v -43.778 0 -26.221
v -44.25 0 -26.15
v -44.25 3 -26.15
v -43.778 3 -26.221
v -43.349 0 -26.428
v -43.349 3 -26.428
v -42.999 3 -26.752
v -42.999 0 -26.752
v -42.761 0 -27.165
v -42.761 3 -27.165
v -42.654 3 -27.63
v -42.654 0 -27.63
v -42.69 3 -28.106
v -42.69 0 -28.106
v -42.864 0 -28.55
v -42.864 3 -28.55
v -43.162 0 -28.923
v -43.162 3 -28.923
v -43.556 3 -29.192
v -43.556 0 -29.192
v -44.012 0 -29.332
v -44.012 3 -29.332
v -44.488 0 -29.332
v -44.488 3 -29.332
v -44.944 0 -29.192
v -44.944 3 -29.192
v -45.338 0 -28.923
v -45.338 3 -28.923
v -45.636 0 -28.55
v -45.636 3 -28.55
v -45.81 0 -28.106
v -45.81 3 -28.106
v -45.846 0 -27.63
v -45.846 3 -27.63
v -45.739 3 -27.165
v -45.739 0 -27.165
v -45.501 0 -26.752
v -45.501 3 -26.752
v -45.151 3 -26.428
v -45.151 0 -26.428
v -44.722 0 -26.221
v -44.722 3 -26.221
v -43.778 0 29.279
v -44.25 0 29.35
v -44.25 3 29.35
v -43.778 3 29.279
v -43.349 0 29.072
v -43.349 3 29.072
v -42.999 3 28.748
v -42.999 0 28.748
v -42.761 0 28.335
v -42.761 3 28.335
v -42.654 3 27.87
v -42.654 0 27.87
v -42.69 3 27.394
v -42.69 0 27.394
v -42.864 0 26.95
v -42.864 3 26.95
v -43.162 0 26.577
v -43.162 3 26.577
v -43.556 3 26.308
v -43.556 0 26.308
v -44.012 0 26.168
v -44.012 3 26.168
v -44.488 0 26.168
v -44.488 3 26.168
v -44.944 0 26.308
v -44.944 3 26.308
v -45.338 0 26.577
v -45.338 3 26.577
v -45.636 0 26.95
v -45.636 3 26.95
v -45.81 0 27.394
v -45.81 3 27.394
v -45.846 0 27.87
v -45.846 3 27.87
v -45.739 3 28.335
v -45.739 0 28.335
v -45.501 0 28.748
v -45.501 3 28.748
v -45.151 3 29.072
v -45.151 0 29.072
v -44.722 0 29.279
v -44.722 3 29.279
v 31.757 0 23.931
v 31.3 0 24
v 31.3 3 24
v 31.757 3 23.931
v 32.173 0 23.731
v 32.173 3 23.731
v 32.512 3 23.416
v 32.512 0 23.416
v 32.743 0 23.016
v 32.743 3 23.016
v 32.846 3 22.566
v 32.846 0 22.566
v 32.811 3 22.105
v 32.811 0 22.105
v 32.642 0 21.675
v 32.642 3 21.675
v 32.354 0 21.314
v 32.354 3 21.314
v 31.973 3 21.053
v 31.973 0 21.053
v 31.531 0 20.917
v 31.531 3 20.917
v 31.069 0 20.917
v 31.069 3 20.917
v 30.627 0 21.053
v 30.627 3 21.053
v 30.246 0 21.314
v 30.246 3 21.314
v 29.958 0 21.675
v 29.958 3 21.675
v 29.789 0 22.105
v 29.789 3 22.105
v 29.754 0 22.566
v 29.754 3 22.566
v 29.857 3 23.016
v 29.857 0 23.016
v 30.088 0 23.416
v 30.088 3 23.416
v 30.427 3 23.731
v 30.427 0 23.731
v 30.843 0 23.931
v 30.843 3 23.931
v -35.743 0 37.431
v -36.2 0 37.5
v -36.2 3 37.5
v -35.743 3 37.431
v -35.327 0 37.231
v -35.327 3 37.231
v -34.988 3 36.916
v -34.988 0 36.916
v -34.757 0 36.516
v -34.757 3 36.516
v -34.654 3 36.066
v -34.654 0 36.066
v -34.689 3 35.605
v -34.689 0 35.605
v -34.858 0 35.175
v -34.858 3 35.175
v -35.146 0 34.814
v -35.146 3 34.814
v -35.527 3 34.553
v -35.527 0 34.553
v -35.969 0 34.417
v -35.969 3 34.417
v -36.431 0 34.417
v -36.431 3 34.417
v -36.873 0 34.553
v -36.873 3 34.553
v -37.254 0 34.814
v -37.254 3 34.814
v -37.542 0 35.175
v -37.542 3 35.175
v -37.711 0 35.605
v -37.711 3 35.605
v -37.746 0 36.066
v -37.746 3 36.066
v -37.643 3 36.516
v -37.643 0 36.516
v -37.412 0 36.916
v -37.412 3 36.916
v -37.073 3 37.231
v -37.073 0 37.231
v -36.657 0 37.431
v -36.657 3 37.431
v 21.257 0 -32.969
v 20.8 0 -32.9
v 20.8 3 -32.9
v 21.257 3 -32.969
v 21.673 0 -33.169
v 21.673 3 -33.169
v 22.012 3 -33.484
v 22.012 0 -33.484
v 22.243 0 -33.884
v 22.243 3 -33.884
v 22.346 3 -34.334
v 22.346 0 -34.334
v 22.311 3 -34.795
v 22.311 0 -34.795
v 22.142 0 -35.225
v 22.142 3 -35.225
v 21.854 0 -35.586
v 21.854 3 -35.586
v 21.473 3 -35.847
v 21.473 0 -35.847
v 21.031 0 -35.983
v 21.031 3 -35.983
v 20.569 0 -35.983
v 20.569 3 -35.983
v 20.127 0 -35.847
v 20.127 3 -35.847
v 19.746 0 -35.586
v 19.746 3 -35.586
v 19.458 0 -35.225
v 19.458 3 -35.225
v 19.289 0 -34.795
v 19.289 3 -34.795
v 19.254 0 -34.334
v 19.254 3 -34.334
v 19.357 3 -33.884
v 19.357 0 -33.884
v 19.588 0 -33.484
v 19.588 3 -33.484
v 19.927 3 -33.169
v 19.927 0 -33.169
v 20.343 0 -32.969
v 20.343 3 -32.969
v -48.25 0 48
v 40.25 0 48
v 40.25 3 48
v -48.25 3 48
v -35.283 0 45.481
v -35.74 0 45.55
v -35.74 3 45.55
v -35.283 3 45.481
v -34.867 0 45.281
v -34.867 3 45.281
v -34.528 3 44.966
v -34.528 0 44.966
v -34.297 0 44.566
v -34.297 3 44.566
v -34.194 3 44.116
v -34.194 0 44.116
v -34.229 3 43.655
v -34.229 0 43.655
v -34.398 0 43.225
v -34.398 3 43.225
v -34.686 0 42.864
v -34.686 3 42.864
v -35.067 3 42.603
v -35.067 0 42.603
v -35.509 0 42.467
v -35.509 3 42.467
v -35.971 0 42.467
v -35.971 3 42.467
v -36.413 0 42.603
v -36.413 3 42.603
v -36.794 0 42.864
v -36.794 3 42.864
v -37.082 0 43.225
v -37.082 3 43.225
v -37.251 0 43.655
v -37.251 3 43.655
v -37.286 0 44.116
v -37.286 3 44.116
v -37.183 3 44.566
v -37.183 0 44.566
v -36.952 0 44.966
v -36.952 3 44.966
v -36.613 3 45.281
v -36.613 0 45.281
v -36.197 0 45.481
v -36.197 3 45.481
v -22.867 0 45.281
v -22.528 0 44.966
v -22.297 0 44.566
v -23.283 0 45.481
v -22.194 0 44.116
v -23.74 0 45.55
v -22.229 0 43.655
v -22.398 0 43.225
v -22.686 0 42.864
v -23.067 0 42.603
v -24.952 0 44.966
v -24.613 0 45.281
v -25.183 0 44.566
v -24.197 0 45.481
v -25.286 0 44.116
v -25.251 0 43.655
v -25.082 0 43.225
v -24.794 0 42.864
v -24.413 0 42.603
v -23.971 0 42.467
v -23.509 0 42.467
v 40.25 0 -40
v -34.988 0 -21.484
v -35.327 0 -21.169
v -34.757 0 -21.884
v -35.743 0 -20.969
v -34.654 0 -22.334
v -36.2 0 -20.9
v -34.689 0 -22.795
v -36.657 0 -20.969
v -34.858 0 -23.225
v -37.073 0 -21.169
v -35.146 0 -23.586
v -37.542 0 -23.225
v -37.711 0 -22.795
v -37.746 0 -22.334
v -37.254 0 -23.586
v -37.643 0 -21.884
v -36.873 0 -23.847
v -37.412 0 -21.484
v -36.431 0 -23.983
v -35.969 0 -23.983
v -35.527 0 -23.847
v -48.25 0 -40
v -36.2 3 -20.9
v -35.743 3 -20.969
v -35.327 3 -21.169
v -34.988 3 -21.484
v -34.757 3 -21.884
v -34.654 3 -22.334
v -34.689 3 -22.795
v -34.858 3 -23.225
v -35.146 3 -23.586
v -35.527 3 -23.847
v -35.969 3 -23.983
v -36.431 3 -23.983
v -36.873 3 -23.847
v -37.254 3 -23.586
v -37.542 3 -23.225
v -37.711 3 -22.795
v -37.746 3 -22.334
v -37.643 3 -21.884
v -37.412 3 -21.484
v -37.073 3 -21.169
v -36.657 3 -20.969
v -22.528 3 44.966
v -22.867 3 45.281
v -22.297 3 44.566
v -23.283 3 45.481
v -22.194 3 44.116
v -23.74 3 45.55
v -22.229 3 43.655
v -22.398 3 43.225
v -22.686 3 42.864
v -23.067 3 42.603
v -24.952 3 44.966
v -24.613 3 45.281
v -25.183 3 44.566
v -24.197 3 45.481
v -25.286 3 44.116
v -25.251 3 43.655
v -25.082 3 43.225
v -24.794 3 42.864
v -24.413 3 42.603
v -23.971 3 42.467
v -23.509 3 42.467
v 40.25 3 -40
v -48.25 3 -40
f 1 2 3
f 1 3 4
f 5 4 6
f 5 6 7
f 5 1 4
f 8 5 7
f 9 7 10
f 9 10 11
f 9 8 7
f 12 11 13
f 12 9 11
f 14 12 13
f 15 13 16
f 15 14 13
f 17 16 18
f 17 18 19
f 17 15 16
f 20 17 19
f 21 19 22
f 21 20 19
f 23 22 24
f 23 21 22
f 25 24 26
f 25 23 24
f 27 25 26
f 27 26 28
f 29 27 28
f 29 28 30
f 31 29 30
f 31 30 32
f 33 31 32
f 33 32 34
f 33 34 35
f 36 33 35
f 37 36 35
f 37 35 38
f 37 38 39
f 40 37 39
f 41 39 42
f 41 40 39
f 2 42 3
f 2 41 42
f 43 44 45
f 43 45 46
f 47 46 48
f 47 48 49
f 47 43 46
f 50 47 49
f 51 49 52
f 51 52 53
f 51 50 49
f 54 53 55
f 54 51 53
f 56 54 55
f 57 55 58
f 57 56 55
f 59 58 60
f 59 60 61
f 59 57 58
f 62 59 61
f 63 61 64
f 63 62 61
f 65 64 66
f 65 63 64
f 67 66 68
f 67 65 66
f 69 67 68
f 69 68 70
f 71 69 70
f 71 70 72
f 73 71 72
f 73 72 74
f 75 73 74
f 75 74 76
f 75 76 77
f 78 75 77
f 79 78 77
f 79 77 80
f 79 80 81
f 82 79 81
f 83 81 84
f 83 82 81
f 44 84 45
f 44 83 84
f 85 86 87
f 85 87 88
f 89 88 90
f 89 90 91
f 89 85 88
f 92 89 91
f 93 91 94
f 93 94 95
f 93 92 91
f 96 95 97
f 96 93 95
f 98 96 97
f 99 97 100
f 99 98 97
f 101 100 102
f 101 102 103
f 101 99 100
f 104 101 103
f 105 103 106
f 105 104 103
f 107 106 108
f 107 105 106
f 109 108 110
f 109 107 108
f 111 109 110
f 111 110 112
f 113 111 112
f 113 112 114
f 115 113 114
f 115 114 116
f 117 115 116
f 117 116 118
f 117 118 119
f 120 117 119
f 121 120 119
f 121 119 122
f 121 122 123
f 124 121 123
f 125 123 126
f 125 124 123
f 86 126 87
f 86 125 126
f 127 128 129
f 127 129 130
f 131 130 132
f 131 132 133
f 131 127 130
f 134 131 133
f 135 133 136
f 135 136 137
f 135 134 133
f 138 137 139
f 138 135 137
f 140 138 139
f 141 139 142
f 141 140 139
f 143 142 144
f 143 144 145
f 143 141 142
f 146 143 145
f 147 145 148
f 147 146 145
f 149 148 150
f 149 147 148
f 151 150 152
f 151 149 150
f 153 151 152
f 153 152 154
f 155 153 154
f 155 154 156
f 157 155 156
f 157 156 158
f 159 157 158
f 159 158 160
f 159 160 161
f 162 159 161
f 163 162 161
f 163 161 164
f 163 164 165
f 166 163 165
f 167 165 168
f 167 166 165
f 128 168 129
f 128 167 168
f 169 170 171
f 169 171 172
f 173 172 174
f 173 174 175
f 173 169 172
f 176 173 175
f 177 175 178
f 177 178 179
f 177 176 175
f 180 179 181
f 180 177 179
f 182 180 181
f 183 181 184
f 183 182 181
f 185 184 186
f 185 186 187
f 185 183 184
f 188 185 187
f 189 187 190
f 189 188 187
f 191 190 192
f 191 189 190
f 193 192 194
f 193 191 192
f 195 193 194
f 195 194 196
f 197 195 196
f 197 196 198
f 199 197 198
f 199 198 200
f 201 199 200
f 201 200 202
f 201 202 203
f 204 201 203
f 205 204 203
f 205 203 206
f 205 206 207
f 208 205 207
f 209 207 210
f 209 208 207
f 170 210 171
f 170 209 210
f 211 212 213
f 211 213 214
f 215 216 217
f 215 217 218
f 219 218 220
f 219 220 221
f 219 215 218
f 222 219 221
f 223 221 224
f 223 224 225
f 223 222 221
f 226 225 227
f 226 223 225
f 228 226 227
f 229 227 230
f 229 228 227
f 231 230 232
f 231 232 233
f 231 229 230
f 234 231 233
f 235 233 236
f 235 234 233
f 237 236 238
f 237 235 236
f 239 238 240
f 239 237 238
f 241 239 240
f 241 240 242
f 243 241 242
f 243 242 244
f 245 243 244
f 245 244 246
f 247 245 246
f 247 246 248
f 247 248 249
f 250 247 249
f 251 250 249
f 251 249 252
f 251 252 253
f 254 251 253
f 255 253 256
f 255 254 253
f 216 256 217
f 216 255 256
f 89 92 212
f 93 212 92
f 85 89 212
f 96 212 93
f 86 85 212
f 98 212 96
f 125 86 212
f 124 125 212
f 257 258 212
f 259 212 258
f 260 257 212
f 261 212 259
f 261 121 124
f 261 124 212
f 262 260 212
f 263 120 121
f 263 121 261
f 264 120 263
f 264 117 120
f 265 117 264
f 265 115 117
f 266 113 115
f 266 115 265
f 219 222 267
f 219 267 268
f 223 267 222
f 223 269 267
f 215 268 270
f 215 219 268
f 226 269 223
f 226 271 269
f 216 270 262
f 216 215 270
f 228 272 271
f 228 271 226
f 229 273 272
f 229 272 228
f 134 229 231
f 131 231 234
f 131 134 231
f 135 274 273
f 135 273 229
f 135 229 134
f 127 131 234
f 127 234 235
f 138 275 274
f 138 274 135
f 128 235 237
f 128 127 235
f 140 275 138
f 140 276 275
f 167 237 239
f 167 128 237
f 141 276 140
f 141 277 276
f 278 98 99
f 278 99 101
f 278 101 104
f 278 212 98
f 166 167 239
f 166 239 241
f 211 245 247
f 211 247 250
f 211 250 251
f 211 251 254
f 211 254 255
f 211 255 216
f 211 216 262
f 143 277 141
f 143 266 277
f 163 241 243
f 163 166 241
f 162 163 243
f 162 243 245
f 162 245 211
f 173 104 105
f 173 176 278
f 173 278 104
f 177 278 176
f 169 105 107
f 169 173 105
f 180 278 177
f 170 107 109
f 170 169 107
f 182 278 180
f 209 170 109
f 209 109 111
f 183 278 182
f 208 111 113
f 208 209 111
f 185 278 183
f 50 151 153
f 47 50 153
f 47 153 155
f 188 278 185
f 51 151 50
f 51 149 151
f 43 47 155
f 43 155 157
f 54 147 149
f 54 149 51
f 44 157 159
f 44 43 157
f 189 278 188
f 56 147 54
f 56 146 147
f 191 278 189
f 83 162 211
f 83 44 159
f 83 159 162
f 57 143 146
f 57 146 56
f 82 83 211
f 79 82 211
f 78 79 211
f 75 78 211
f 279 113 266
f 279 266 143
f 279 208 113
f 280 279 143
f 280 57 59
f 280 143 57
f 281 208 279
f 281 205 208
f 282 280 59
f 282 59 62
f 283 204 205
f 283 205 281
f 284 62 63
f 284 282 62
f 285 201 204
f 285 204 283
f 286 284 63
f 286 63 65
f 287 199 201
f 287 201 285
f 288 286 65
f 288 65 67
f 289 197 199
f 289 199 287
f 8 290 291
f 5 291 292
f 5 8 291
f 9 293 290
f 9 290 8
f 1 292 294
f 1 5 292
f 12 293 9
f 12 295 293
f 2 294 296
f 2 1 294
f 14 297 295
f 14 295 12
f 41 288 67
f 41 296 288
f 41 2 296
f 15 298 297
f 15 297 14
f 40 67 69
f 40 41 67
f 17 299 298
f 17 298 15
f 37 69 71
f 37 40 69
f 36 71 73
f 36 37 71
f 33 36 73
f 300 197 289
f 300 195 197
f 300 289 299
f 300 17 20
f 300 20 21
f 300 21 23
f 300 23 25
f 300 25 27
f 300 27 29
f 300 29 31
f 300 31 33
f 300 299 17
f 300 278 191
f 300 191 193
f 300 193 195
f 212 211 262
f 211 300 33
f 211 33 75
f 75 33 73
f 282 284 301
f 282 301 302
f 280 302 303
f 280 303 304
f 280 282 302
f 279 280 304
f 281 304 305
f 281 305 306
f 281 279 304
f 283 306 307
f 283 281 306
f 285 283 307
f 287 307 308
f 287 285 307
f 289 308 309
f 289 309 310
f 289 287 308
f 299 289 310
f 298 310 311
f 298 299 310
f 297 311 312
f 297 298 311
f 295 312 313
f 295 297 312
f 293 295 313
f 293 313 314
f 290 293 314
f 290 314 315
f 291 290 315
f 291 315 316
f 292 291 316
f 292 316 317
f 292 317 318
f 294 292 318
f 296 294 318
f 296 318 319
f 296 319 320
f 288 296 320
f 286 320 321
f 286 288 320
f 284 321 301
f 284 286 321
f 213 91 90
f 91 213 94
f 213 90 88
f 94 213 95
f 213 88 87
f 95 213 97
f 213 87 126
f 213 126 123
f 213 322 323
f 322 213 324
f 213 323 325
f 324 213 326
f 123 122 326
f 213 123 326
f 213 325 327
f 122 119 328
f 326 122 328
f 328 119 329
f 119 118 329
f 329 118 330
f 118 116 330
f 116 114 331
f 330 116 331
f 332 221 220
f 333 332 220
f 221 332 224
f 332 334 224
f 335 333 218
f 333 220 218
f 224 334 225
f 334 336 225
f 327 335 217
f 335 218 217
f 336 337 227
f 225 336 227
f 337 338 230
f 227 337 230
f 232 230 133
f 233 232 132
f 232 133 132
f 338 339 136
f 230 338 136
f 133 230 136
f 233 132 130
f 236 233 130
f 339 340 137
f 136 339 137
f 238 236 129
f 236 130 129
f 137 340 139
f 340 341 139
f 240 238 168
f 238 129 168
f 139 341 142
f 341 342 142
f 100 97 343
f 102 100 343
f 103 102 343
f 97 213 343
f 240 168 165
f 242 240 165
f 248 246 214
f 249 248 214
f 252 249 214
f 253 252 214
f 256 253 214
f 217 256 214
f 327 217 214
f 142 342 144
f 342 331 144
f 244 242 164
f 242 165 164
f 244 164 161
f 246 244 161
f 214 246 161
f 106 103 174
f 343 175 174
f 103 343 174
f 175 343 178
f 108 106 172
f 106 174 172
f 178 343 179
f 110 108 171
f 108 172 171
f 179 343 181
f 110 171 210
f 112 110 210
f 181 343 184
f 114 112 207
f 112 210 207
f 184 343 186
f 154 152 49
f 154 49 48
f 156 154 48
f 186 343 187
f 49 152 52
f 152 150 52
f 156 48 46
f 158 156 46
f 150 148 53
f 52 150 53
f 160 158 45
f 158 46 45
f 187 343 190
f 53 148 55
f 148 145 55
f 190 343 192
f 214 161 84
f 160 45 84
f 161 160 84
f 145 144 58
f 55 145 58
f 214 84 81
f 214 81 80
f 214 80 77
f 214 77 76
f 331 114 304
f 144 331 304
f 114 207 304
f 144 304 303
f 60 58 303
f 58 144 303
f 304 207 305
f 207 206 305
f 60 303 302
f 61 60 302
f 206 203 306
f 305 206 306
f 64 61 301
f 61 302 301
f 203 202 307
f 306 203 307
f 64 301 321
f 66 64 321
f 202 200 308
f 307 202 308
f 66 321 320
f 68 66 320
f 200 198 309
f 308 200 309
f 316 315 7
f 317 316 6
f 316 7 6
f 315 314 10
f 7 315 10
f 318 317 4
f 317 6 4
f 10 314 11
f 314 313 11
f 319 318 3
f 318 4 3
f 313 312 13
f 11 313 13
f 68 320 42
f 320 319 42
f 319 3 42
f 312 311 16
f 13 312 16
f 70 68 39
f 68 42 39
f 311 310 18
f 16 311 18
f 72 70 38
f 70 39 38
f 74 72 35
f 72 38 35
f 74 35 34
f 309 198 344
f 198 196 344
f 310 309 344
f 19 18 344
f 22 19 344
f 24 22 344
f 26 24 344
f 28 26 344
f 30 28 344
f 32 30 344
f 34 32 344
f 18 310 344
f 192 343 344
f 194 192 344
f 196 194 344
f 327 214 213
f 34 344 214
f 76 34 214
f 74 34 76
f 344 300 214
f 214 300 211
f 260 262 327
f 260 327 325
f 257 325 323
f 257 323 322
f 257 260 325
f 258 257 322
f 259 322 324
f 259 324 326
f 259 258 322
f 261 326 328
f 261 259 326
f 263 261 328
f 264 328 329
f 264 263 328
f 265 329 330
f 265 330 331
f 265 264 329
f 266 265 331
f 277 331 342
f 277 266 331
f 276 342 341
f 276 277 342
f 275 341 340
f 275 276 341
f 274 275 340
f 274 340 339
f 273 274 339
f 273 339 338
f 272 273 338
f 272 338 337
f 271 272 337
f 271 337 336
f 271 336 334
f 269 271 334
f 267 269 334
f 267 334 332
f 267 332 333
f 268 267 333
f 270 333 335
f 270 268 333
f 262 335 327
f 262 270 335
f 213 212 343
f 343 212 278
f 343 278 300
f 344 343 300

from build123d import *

# Parameters (mm, degrees)
SKETCH1_R           = 1.55
SKETCH1_R_2         = 1.6
BOSS_EXTRUDE1_DEPTH = 3


with BuildPart() as part:
    # Sketch1 → Boss-Extrude1 (new body)
    with BuildSketch(Plane(origin=(0, 0, 0), x_dir=(1, 0, 0), z_dir=(0, 1, 0))):
        Polygon((-40.25, 40), (40.25, 40), (40.25, -40), (40.25, -48), (-48.25, -48), (-48.25, -40), (-48.25, 40), align=None)
        with Locations(Location((-36.2, -35.95, 0), (0, 0, 270))):
            Circle(SKETCH1_R, mode=Mode.SUBTRACT)
        with Locations(Location((-36.2, 22.45, 0), (0, 0, 270))):
            Circle(SKETCH1_R, mode=Mode.SUBTRACT)
        with Locations(Location((20.8, 34.45, 0), (0, 0, 270))):
            Circle(SKETCH1_R, mode=Mode.SUBTRACT)
        with Locations(Location((31.3, -22.45, 0), (0, 0, 270))):
            Circle(SKETCH1_R, mode=Mode.SUBTRACT)
        with Locations(Location((-44.25, 27.75, 0), (0, 0, 270))):
            Circle(SKETCH1_R_2, mode=Mode.SUBTRACT)
        with Locations(Location((-44.25, -27.75, 0), (0, 0, 270))):
            Circle(SKETCH1_R_2, mode=Mode.SUBTRACT)
        with Locations(Location((-35.74, -44, 0), (0, 0, 270))):
            Circle(SKETCH1_R, mode=Mode.SUBTRACT)
        with Locations(Location((-23.74, -44, 0), (0, 0, 270))):
            Circle(SKETCH1_R, mode=Mode.SUBTRACT)
    extrude(amount=BOSS_EXTRUDE1_DEPTH)


solid = part.part
